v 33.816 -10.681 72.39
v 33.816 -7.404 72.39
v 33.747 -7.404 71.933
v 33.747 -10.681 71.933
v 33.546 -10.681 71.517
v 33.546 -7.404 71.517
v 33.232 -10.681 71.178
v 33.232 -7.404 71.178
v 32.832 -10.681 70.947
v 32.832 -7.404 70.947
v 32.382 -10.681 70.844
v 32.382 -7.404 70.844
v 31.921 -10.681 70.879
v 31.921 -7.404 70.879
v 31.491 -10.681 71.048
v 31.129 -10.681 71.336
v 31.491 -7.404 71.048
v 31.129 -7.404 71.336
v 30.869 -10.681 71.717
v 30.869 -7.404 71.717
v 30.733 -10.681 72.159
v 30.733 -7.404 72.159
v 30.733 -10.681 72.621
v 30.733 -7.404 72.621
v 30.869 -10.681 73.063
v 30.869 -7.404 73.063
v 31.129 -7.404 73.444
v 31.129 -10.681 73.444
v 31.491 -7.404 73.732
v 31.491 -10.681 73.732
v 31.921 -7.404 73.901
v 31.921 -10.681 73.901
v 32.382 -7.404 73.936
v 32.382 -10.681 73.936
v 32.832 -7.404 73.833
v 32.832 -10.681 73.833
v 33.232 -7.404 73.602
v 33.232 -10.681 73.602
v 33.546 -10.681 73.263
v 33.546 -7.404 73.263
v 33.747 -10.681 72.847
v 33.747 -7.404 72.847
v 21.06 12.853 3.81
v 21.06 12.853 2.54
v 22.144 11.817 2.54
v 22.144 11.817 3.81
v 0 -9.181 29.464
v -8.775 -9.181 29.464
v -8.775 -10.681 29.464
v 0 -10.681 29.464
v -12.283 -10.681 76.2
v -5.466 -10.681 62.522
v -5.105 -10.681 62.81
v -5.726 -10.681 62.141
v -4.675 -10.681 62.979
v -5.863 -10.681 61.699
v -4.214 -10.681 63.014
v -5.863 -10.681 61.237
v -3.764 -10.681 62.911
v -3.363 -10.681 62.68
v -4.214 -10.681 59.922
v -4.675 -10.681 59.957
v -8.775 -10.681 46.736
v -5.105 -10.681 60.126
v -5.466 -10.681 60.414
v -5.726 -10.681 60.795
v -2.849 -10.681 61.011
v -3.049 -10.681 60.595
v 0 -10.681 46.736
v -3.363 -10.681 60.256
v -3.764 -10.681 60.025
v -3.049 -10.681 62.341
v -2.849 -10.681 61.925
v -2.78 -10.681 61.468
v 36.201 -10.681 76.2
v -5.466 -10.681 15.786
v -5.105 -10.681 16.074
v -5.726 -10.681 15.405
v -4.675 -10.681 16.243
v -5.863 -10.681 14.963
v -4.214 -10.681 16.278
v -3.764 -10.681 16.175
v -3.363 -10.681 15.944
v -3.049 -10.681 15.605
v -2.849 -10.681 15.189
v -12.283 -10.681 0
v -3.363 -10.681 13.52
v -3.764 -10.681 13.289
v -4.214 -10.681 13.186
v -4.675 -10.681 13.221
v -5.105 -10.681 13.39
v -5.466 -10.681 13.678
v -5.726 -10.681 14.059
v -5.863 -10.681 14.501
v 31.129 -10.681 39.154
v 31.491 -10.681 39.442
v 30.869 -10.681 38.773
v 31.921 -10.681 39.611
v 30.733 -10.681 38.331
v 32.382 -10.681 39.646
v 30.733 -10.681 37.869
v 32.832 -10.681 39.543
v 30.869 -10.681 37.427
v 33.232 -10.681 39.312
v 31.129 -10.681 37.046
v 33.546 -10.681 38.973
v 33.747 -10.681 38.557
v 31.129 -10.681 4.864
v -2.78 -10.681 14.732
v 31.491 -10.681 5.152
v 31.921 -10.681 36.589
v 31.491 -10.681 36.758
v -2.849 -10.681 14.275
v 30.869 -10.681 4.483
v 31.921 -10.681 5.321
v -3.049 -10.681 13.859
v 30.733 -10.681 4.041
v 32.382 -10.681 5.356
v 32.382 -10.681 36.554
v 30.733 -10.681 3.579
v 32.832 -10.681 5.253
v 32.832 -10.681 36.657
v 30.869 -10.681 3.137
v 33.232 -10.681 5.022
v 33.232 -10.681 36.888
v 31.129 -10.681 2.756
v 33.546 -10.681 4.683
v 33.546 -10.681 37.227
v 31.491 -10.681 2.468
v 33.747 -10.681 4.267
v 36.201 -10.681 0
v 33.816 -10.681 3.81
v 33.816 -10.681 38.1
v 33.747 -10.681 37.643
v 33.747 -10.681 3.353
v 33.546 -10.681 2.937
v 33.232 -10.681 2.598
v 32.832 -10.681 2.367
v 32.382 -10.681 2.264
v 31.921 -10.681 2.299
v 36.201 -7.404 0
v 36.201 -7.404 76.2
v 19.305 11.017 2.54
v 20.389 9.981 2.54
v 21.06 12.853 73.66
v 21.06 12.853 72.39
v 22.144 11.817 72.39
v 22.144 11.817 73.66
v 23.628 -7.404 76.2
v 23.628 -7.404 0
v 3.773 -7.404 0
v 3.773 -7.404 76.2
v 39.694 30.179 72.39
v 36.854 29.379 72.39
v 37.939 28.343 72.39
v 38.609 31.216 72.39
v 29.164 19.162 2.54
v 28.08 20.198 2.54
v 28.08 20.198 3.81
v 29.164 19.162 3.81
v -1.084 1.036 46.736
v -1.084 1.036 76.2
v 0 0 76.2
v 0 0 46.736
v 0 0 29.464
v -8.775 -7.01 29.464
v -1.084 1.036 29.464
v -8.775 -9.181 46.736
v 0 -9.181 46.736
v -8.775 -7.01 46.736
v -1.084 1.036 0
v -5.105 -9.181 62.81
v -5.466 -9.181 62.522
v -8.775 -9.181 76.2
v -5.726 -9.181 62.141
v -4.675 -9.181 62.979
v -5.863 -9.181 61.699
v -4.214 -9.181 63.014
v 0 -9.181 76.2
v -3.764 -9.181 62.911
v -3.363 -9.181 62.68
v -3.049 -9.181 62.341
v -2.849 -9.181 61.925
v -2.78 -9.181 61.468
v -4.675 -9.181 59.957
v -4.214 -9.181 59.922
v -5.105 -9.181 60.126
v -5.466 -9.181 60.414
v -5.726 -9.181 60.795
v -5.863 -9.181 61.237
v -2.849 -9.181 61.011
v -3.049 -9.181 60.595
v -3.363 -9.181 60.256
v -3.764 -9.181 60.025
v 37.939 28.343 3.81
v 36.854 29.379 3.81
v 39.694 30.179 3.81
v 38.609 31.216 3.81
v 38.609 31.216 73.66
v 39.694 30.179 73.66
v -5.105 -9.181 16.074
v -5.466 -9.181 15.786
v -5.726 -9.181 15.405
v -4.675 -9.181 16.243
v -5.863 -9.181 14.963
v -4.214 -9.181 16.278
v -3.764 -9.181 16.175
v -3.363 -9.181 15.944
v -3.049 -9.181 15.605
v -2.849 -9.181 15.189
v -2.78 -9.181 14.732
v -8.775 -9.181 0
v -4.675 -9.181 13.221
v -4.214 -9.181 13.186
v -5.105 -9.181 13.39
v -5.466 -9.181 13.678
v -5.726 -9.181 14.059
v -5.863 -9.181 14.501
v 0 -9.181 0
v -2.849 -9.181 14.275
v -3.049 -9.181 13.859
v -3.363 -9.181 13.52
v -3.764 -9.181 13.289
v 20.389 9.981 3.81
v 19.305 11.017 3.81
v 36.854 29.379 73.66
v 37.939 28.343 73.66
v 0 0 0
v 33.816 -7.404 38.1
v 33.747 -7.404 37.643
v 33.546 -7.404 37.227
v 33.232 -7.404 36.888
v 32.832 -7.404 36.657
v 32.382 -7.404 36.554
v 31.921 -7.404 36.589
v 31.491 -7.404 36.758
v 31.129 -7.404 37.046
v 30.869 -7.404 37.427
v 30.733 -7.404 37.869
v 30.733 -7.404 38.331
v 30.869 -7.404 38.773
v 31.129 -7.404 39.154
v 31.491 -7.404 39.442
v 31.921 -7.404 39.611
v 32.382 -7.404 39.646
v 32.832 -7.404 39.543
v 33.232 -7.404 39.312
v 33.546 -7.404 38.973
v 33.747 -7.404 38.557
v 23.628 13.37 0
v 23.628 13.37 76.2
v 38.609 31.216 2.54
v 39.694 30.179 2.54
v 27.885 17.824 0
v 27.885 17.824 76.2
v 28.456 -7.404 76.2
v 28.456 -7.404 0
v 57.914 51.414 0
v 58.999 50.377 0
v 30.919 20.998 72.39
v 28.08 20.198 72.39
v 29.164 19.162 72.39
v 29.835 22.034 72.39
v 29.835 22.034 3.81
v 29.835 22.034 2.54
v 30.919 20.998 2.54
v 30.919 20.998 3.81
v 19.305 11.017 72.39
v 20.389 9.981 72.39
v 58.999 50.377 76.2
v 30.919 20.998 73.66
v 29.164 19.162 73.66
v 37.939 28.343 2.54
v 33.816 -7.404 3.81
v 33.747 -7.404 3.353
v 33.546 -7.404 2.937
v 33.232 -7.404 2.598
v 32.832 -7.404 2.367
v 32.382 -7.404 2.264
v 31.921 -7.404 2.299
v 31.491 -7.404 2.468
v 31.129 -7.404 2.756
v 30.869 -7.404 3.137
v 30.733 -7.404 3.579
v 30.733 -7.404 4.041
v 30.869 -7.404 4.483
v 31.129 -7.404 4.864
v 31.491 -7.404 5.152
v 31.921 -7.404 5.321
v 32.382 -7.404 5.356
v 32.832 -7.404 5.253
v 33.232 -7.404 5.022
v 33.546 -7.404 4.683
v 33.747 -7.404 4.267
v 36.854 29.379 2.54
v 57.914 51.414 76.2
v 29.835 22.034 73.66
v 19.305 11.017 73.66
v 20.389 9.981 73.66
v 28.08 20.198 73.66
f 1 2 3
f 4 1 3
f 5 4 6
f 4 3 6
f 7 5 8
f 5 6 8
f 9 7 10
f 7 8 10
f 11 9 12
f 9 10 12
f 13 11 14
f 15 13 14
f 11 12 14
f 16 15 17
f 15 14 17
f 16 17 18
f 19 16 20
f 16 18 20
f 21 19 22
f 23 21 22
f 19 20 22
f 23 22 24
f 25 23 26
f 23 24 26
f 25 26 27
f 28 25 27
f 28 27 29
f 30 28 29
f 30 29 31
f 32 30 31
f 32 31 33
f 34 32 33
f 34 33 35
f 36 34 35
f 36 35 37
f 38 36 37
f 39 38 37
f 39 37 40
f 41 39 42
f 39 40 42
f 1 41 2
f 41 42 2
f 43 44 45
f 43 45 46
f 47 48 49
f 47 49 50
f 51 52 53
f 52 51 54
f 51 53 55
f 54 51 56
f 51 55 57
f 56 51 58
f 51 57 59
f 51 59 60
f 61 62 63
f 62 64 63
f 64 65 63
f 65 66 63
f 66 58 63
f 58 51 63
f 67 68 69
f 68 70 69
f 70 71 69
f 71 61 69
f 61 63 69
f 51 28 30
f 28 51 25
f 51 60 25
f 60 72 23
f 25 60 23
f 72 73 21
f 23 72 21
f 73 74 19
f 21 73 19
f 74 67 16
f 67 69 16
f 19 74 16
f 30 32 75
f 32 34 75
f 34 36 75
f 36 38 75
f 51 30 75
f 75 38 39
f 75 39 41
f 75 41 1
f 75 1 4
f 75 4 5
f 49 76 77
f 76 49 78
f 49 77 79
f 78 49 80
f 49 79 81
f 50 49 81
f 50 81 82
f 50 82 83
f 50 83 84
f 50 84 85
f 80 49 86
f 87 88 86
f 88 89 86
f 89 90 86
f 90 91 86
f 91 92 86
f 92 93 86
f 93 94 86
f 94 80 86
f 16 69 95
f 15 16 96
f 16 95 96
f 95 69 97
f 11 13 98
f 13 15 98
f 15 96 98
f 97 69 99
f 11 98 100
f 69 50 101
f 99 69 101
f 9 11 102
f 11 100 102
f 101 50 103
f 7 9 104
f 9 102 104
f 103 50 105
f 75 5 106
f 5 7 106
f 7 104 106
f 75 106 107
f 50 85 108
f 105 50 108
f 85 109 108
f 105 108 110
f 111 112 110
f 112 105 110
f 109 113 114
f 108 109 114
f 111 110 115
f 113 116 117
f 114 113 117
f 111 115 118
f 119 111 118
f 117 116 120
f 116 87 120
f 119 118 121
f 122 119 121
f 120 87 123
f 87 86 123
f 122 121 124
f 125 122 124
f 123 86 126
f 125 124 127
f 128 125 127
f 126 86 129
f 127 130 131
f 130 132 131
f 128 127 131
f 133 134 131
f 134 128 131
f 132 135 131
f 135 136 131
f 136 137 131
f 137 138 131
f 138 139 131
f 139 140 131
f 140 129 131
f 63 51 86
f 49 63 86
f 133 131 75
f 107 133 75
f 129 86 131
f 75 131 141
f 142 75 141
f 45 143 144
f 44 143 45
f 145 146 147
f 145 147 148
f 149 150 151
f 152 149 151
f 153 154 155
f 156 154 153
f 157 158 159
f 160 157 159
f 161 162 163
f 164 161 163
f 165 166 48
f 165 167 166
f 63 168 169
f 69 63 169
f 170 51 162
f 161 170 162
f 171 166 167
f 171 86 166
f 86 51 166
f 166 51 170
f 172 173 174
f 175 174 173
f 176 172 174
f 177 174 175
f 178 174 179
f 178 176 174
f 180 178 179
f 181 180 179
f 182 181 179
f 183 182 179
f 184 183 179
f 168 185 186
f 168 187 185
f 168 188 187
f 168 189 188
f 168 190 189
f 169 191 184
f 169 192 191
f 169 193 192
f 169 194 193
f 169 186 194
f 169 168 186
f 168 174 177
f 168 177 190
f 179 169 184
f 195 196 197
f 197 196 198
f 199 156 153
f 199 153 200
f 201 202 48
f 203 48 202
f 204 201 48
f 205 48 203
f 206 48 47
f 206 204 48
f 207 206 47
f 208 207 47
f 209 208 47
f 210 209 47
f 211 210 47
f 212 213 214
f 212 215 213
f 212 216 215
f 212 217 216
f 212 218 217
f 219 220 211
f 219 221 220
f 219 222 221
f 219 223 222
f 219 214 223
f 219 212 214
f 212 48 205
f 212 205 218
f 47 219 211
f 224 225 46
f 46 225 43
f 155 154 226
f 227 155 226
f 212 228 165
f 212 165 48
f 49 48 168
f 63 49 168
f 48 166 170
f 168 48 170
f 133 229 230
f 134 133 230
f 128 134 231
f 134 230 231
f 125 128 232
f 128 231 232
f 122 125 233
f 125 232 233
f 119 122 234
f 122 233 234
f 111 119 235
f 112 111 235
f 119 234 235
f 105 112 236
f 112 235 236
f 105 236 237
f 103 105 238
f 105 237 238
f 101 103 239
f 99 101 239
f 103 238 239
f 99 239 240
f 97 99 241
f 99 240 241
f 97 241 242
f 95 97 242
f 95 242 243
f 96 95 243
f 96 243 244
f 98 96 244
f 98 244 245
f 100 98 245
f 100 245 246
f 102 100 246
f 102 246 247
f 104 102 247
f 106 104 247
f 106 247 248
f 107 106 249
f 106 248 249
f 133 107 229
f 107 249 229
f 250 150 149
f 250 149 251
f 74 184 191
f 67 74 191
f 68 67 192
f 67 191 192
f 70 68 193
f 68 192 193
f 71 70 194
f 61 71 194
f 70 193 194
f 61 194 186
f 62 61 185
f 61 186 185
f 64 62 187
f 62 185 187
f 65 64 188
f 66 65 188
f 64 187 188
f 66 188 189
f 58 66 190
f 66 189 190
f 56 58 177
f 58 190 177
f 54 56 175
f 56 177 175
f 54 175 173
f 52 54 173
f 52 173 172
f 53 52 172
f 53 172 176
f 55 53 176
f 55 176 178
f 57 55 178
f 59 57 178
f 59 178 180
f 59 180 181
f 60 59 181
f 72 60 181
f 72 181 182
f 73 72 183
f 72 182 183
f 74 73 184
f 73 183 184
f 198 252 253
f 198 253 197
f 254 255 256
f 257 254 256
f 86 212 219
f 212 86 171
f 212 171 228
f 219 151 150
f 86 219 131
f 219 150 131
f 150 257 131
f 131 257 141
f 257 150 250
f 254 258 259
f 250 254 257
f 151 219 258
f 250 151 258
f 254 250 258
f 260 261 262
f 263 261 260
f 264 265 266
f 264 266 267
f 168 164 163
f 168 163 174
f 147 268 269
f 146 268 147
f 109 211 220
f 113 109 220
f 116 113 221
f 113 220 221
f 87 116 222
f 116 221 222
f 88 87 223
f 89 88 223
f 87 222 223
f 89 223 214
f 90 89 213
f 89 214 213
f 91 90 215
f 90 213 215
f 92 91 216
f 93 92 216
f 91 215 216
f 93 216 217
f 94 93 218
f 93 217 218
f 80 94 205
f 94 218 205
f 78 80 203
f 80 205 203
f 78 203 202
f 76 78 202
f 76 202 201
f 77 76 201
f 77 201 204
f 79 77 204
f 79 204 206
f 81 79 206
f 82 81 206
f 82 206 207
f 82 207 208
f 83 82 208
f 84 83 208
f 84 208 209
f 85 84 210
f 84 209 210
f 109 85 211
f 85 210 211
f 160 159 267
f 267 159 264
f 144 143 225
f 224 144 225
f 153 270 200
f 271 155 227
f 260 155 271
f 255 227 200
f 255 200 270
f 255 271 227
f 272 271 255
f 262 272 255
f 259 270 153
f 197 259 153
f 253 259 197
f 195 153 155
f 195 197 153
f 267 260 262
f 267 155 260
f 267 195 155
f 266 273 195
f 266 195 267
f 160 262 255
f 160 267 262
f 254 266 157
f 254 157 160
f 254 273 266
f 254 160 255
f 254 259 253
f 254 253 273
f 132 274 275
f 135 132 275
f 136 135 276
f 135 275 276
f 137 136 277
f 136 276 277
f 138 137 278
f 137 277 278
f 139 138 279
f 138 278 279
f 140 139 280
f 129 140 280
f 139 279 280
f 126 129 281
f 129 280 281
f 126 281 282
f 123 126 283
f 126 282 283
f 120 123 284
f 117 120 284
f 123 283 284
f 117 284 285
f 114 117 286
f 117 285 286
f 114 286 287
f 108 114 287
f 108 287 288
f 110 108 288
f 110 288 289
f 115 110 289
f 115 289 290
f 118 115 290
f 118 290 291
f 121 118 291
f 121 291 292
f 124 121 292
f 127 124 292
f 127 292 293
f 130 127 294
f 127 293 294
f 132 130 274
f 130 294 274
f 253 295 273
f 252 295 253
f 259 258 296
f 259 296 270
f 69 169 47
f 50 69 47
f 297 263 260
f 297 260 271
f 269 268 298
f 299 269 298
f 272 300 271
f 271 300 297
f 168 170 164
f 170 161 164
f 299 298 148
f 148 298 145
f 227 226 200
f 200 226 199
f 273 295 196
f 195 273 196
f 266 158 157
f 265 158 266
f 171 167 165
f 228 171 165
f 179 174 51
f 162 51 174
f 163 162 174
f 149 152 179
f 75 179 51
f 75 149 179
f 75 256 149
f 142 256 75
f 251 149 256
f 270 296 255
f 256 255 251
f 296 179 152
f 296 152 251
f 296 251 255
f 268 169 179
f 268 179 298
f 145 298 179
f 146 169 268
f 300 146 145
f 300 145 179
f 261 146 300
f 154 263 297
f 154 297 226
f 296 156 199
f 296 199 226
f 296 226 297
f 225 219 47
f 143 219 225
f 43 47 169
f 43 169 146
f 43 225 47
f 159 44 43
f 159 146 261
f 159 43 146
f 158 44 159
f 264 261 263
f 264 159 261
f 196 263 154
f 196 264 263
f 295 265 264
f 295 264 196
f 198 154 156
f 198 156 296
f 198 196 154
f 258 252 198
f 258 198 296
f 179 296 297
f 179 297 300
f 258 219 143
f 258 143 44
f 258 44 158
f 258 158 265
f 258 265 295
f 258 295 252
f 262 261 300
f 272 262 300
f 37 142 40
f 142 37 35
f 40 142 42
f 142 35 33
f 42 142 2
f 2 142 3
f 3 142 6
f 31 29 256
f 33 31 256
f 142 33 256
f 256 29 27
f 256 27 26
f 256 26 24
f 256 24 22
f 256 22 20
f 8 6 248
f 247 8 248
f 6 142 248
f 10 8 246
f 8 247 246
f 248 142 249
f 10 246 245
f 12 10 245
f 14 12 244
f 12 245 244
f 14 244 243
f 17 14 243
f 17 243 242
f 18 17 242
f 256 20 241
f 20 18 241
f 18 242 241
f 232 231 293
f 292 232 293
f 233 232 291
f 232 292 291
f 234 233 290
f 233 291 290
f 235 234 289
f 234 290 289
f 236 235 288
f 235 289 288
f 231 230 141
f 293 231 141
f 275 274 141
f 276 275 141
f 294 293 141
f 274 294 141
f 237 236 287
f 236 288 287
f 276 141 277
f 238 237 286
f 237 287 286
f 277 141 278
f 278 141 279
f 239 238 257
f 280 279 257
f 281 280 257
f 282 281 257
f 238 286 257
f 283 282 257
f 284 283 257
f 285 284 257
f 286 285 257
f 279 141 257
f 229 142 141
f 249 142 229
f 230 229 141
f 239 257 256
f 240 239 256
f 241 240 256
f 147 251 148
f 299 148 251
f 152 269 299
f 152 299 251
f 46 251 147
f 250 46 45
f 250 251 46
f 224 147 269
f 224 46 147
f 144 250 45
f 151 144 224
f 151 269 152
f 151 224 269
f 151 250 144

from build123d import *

# Parameters (mm, degrees)
BOSS_EXTRUDE1_DEPTH = 76.2
SKETCH3_W           = 8.774879522
SKETCH3_H           = 8.636
CUT_EXTRUDE1_DEPTH  = 33.02
SKETCH5_W           = 1.27
SKETCH5_H           = 2.54
CUT_EXTRUDE2_DEPTH  = 1.5
BOSS_EXTRUDE2_DEPTH = 76.2
SKETCH7_R           = 1.55
CUT_EXTRUDE3_DEPTH  = 3.2766
SKETCH9_R           = 1.55
CUT_EXTRUDE4_DEPTH  = 1.5


with BuildPart() as part:
    # Sketch1 → Boss-Extrude1 (new body)
    with BuildSketch(Plane.XY):
        Polygon((3.772933373, -7.404439667), (0.641286927, -10.681039667), (36.201286927, -10.681039667), (36.201286927, -7.404439667), align=None)
        Polygon((57.914204847, 51.413822136), (58.998579611, 50.377419043), (0.641286927, -10.681039667), (-12.283449407, -10.681039667), (-1.084374764, 1.036403093), (0, 0), (-8.774879522, -9.181039667), (0, -9.181039667), align=None)
    extrude(amount=BOSS_EXTRUDE1_DEPTH)

    # Sketch3 → Cut-Extrude1 (cut, symmetric)
    with BuildSketch(Plane(origin=(0, -9.181039667, 0), x_dir=(1, 0, 0), z_dir=(0, 1, 0))):
        with Locations((-4.387439761, -42.418)):
            Rectangle(SKETCH3_W, SKETCH3_H)
        with Locations((-4.387439761, -33.782)):
            Rectangle(SKETCH3_W, SKETCH3_H)
    extrude(amount=CUT_EXTRUDE1_DEPTH, both=True, mode=Mode.SUBTRACT)

    # Sketch5 → Cut-Extrude2 (cut)
    with BuildSketch(Plane(origin=(4.585824688, -4.382952324, 0), x_dir=(0, 0, 1), z_dir=(-0.722916509, 0.690935395, 0))):
        with Locations((3.175, 22.572874853)):
            Rectangle(SKETCH5_W, SKETCH5_H)
        with Locations((3.175, 35.272874853)):
            Rectangle(SKETCH5_W, SKETCH5_H)
        with Locations((3.175, 47.972874853)):
            Rectangle(SKETCH5_W, SKETCH5_H)
        with Locations((73.025, 22.572874853)):
            Rectangle(SKETCH5_W, SKETCH5_H)
        with Locations((73.025, 35.272874853)):
            Rectangle(SKETCH5_W, SKETCH5_H)
        with Locations((73.025, 47.972874853)):
            Rectangle(SKETCH5_W, SKETCH5_H)
    extrude(amount=-CUT_EXTRUDE2_DEPTH, mode=Mode.SUBTRACT)

    # Sketch6 → Boss-Extrude2 (add)
    with BuildSketch(Plane.XY.offset(76.2)):
        Polygon((23.628168528, -7.404439667), (23.628168528, 13.36982864), (27.885054397, 17.823751673), (28.455712225, -7.404439667), align=None)
    extrude(amount=-BOSS_EXTRUDE2_DEPTH)

    # Sketch7 → Cut-Extrude3 (cut)
    with BuildSketch(Plane(origin=(0, -7.404439667, 0), x_dir=(1, 0, 0), z_dir=(0, 1, 0))):
        with Locations((32.265712225, -72.39)):
            Circle(SKETCH7_R)
        with Locations((32.265712225, -3.81)):
            Circle(SKETCH7_R)
        with Locations((32.265712225, -38.1)):
            Circle(SKETCH7_R)
    extrude(amount=-CUT_EXTRUDE3_DEPTH, mode=Mode.SUBTRACT)

    # Sketch9 → Cut-Extrude4 (cut)
    with BuildSketch(Plane(origin=(0, -9.181039667, 0), x_dir=(1, 0, 0), z_dir=(0, 1, 0))):
        with Locations((-4.329879522, -61.468)):
            Circle(SKETCH9_R)
        with Locations((-4.329879522, -14.732)):
            Circle(SKETCH9_R)
    extrude(amount=-CUT_EXTRUDE4_DEPTH, mode=Mode.SUBTRACT)


solid = part.part
